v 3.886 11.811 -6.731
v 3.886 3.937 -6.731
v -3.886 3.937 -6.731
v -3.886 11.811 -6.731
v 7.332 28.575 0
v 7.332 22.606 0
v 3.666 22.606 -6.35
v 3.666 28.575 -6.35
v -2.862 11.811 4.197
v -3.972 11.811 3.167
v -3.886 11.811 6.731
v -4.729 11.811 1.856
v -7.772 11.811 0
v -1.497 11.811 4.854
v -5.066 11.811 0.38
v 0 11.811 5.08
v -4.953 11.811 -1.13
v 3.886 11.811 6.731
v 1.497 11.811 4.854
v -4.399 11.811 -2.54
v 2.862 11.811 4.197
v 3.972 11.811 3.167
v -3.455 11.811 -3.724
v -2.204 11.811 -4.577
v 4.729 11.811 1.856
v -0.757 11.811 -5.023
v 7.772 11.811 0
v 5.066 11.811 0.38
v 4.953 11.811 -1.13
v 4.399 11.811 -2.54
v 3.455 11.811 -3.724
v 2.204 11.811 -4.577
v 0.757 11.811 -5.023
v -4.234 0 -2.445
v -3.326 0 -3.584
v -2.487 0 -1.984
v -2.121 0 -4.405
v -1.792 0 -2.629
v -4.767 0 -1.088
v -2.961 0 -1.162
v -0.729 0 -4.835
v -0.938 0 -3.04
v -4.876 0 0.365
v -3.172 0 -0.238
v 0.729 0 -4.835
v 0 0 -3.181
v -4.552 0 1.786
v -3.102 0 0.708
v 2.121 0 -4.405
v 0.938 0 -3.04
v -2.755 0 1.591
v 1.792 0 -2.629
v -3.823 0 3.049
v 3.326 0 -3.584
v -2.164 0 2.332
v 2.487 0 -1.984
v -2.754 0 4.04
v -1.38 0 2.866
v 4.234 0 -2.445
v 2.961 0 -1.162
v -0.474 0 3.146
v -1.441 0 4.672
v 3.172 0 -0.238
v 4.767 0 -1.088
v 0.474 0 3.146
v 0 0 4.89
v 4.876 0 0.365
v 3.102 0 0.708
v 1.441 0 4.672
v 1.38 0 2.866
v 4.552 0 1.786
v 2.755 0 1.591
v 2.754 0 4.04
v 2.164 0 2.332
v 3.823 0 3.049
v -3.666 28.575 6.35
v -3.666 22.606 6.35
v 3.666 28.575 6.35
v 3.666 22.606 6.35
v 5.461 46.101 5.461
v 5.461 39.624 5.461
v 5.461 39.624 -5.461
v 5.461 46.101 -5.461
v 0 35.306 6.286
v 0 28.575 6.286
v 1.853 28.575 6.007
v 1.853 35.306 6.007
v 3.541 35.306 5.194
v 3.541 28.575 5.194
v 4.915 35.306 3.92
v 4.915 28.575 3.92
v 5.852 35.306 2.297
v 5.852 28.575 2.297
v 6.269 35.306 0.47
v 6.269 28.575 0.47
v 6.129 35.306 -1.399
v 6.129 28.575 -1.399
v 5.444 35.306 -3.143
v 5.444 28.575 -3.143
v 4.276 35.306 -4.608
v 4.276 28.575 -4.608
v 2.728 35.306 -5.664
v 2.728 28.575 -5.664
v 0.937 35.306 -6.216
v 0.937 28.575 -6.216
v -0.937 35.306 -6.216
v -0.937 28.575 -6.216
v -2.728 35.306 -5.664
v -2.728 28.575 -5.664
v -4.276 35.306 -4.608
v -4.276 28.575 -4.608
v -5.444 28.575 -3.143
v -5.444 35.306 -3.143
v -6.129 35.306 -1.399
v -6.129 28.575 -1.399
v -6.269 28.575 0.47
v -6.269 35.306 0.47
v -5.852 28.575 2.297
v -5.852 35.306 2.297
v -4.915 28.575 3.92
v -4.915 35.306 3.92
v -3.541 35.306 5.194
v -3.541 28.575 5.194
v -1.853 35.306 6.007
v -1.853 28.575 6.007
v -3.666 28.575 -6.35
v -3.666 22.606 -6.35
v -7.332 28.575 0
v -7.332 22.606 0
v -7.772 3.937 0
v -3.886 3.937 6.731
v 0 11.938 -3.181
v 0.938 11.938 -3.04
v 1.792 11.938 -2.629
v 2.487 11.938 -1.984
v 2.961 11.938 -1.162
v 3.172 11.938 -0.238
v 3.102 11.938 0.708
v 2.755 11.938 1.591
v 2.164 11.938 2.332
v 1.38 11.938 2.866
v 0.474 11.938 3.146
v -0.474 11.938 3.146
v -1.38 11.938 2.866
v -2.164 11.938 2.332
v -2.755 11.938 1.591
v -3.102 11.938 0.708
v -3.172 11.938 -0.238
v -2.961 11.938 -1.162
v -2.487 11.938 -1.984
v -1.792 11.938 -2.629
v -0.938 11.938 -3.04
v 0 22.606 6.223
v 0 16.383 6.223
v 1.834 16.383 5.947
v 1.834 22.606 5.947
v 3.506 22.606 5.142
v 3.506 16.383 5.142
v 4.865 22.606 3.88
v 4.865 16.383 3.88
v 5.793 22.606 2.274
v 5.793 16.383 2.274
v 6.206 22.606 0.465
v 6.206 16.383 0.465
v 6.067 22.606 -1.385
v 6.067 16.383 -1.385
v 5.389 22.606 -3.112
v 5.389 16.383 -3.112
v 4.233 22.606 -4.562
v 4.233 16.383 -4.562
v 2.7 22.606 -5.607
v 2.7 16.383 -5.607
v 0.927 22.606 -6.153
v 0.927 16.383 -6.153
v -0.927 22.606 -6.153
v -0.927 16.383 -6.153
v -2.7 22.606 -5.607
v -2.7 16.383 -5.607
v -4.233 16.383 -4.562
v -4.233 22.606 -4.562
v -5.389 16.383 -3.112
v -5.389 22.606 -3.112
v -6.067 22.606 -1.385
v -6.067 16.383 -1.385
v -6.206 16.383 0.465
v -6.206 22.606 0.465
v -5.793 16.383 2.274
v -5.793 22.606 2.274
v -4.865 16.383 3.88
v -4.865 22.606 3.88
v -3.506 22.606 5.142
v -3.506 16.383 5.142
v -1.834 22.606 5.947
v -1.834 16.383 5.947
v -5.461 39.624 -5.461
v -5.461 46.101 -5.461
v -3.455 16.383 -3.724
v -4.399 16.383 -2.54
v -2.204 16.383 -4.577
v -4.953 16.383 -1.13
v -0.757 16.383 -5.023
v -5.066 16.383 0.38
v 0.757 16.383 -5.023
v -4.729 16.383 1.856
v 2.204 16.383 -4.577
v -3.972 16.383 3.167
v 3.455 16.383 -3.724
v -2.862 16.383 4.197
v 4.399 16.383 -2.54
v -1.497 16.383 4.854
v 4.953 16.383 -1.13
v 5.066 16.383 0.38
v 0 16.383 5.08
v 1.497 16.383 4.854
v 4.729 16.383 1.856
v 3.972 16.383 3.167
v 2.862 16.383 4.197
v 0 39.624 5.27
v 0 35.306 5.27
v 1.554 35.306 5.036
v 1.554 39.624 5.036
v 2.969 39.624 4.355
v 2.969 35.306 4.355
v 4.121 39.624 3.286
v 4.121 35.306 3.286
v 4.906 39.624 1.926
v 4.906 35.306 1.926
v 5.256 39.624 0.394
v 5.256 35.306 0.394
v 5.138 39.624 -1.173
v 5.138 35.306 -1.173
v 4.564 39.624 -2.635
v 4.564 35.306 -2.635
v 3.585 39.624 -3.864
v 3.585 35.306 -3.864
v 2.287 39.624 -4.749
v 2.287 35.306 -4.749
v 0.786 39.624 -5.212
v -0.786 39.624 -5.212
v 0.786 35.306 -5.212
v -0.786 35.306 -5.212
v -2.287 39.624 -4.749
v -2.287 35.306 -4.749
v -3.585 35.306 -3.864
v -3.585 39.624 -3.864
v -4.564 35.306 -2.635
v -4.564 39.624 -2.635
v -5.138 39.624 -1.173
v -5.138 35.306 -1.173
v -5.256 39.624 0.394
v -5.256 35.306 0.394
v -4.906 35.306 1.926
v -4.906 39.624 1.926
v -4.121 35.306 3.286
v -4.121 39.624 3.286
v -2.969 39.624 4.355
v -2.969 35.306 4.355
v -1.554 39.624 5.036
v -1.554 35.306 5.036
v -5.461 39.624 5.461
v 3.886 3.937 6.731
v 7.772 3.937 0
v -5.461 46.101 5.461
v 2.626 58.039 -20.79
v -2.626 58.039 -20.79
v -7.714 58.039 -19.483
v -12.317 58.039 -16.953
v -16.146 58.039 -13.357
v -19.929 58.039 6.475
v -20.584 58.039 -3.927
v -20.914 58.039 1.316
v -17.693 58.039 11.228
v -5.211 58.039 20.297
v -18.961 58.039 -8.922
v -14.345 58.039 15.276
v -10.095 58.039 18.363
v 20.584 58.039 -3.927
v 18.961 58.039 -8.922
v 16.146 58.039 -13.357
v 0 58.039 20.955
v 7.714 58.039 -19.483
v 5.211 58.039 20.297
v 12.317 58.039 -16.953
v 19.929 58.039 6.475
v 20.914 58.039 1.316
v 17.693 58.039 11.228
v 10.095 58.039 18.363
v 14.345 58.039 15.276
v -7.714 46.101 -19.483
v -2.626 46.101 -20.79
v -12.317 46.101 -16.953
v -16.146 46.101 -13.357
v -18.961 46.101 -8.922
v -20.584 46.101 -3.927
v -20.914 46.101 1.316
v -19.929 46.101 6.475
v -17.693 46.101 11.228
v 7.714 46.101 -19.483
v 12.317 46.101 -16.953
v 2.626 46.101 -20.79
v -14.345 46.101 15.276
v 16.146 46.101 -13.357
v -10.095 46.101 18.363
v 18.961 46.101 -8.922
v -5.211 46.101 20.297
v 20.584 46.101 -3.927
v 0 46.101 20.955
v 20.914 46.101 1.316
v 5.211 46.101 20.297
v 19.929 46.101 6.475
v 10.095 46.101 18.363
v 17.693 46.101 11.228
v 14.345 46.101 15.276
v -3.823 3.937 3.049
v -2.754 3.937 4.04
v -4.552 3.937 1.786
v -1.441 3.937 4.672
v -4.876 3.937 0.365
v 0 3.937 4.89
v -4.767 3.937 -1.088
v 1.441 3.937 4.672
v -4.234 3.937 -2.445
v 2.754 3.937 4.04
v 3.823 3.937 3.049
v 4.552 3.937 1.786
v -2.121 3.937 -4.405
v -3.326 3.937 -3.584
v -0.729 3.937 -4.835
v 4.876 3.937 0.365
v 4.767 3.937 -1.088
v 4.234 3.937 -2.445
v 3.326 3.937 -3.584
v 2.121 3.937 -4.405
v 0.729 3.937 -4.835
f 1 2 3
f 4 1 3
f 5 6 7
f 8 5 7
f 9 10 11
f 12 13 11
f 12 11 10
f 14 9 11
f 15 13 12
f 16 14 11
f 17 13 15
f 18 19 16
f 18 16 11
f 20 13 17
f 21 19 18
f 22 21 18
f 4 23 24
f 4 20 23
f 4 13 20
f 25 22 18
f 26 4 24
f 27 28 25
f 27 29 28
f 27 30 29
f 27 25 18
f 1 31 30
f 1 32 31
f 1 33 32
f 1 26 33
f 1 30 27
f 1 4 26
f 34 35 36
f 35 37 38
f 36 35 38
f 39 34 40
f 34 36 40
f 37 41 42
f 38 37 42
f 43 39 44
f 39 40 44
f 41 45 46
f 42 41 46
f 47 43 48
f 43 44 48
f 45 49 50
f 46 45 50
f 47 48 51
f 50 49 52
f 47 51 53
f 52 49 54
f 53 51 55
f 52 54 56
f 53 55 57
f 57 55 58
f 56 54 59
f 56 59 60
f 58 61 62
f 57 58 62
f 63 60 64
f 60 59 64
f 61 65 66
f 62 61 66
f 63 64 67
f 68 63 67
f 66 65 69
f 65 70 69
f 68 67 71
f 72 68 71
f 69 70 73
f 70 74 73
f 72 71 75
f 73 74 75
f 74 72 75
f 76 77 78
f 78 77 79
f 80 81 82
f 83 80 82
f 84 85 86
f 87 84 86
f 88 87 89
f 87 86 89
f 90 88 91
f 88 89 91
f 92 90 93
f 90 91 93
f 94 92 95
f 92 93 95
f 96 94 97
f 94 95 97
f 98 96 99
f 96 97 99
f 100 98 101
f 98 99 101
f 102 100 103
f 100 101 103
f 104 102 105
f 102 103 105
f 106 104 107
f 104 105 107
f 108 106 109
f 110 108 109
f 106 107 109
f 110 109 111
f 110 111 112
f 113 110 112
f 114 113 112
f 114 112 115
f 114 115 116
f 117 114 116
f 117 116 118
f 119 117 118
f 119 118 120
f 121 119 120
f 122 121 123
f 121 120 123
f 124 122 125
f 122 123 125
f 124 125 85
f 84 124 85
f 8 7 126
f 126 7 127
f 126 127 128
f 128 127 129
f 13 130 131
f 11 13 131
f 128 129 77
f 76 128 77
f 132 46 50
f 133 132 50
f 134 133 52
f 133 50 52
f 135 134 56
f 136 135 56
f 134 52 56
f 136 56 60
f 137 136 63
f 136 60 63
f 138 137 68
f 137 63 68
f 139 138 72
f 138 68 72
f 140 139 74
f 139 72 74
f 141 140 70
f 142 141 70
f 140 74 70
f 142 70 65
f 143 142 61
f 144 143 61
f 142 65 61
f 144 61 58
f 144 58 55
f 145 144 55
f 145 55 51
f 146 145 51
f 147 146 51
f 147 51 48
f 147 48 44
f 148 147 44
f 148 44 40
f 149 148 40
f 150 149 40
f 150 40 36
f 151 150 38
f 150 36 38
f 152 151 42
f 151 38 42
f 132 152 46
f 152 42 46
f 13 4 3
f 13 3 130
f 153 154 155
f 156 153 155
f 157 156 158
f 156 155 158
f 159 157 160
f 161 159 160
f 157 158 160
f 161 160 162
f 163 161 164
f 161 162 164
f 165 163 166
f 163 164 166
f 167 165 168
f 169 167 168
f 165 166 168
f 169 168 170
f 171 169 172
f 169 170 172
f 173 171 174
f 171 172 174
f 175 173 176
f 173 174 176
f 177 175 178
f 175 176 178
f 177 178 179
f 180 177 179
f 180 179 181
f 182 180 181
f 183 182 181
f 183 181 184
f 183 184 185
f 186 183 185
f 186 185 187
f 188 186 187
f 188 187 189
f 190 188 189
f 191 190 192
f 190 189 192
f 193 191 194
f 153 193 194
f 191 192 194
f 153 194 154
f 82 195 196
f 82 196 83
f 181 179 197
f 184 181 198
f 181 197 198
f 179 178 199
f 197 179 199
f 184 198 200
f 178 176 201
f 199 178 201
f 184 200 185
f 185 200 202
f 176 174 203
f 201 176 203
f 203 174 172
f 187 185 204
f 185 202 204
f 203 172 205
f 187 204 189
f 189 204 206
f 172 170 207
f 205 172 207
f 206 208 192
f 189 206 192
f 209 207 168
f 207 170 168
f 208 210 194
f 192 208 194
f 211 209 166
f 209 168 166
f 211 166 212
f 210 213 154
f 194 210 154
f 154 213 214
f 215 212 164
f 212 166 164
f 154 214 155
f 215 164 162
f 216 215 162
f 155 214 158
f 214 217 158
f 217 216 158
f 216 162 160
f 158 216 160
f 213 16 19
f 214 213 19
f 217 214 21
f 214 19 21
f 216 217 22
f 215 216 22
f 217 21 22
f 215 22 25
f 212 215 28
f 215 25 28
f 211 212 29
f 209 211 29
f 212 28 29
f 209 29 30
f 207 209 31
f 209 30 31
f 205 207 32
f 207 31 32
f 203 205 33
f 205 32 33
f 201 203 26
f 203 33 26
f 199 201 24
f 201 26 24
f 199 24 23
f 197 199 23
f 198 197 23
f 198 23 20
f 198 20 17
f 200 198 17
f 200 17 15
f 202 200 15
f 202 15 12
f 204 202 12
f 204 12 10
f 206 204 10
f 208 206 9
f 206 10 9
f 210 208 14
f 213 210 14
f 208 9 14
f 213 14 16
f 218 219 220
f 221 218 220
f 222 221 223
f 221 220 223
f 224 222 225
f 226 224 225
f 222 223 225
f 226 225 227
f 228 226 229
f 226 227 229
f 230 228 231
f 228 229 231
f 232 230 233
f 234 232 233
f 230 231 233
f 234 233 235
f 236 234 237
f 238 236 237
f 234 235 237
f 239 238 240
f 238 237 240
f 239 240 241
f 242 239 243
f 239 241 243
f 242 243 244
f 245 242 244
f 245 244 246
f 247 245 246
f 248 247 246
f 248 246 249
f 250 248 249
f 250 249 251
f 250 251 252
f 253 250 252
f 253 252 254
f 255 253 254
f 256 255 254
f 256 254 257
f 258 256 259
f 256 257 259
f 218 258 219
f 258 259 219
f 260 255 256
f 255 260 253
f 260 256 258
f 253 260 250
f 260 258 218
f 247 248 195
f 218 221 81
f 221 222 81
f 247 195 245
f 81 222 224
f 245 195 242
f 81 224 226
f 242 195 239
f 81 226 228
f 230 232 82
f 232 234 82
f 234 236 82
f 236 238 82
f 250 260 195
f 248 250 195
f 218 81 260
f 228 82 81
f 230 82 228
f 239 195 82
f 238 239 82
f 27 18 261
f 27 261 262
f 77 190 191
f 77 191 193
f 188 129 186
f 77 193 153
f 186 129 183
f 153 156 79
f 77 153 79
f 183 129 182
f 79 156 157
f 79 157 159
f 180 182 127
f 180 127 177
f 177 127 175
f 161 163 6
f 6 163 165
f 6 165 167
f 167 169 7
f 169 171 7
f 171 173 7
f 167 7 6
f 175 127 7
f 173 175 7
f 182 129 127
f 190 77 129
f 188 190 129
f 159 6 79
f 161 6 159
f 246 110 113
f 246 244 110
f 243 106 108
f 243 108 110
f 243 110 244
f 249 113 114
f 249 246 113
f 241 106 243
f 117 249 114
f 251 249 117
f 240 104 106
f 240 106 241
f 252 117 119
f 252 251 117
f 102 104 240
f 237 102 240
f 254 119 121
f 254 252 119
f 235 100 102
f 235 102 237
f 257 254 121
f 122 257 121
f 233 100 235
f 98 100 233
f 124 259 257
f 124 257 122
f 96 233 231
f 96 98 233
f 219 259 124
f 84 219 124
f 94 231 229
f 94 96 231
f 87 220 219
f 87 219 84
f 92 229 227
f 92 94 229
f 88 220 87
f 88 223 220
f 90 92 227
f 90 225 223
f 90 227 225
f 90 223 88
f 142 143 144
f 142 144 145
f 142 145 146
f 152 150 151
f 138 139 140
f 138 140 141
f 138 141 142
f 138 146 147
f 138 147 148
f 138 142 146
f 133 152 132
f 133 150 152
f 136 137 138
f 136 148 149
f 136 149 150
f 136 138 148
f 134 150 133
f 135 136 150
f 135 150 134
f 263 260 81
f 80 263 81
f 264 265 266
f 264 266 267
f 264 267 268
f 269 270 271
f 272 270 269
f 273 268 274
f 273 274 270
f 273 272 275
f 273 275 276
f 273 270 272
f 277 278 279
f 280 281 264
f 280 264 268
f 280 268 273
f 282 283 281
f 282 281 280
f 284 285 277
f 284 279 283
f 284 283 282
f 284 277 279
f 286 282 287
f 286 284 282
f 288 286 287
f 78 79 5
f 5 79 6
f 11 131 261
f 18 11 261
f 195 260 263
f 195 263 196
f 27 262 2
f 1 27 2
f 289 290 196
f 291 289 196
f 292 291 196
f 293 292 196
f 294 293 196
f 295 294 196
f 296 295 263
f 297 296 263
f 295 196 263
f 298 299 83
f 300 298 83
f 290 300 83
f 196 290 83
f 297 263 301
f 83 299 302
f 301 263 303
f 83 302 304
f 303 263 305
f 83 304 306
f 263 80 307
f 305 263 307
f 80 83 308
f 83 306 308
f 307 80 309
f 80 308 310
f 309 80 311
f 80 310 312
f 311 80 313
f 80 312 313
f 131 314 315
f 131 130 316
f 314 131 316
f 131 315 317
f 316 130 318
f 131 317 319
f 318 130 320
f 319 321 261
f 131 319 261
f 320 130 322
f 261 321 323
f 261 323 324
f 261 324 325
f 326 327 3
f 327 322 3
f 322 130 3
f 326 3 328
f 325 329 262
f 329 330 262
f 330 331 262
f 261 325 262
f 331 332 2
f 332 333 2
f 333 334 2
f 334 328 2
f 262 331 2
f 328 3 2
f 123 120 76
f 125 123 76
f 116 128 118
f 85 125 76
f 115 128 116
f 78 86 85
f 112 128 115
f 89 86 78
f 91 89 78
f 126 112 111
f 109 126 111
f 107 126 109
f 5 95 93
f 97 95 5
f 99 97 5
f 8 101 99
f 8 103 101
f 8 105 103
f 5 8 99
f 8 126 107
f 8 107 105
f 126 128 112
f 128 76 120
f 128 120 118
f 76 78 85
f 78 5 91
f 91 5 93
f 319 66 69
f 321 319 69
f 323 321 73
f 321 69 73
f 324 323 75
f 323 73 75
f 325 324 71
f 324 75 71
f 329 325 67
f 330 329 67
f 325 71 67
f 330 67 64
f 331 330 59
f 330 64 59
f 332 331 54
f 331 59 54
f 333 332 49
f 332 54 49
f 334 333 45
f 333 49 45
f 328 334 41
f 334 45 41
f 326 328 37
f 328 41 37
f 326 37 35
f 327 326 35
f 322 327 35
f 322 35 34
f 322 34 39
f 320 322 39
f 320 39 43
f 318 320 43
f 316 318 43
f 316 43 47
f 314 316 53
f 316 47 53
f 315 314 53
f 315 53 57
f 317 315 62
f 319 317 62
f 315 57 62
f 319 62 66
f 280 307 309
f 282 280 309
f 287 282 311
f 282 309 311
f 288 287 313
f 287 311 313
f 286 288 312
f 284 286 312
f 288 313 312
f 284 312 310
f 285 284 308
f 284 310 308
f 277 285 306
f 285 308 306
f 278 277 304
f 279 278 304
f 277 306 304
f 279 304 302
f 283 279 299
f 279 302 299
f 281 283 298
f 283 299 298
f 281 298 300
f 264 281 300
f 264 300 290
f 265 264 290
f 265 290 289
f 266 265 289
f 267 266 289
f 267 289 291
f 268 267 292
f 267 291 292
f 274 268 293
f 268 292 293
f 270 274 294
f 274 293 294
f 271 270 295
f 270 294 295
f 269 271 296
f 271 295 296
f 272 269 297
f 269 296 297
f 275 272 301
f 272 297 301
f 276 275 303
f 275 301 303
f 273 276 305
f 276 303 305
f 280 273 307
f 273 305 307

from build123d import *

# Parameters (mm, degrees)
SKETCH1_R           = 4.8895
BOSS_EXTRUDE1_DEPTH = 3.937
BOSS_EXTRUDE2_DEPTH = 7.874
SKETCH3_R           = 5.08
BOSS_EXTRUDE3_DEPTH = 4.572
SKETCH4_R           = 6.223
BOSS_EXTRUDE4_DEPTH = 6.223
BOSS_EXTRUDE5_DEPTH = 5.969
SKETCH6_R           = 6.2865
BOSS_EXTRUDE6_DEPTH = 6.731
SKETCH7_R           = 5.2705
BOSS_EXTRUDE7_DEPTH = 4.318
SKETCH9_W           = 10.922
SKETCH9_H           = 10.922
BOSS_EXTRUDE8_DEPTH = 6.477
SKETCH10_R          = 20.955
BOSS_EXTRUDE9_DEPTH = 11.938
SKETCH11_R          = 3.18135
CUT_EXTRUDE1_DEPTH  = 11.938


with BuildPart() as part:
    # Sketch1 → Boss-Extrude1 (new body)
    with BuildSketch(Plane(origin=(0, 0, 0), x_dir=(1, 0, 0), z_dir=(0, 1, 0))):
        with Locations(Location((0, 0, 0), (0, 0, 270))):
            Circle(SKETCH1_R)
    extrude(amount=BOSS_EXTRUDE1_DEPTH)

    # Sketch2 → Boss-Extrude2 (add)
    with BuildSketch(Plane(origin=(0, 3.937, 0), x_dir=(1, 0, 0), z_dir=(0, 1, 0))):
        Polygon((7.772289324, 0), (3.886144662, 6.731), (-3.886144662, 6.731), (-7.772289324, 0), (-3.886144662, -6.731), (3.886144662, -6.731), align=None)
    extrude(amount=BOSS_EXTRUDE2_DEPTH)

    # Sketch3 → Boss-Extrude3 (add)
    with BuildSketch(Plane(origin=(0, 11.811, 0), x_dir=(1, 0, 0), z_dir=(0, 1, 0))):
        with Locations(Location((0, 0, 0), (0, 0, 270))):
            Circle(SKETCH3_R)
    extrude(amount=BOSS_EXTRUDE3_DEPTH)

    # Sketch4 → Boss-Extrude4 (add)
    with BuildSketch(Plane(origin=(0, 16.383, 0), x_dir=(1, 0, 0), z_dir=(0, 1, 0))):
        with Locations(Location((0, 0, 0), (0, 0, 270))):
            Circle(SKETCH4_R)
    extrude(amount=BOSS_EXTRUDE4_DEPTH)

    # Sketch5 → Boss-Extrude5 (add)
    with BuildSketch(Plane(origin=(0, 22.606, 0), x_dir=(1, 0, 0), z_dir=(0, 1, 0))):
        Polygon((7.332348419, 0), (3.666174209, 6.35), (-3.666174209, 6.35), (-7.332348419, 0), (-3.666174209, -6.35), (3.666174209, -6.35), align=None)
    extrude(amount=BOSS_EXTRUDE5_DEPTH)

    # Sketch6 → Boss-Extrude6 (add)
    with BuildSketch(Plane(origin=(0, 28.575, 0), x_dir=(1, 0, 0), z_dir=(0, 1, 0))):
        with Locations(Location((0, 0, 0), (0, 0, 270))):
            Circle(SKETCH6_R)
    extrude(amount=BOSS_EXTRUDE6_DEPTH)

    # Sketch7 → Boss-Extrude7 (add)
    with BuildSketch(Plane(origin=(0, 35.306, 0), x_dir=(1, 0, 0), z_dir=(0, 1, 0))):
        with Locations(Location((0, 0, 0), (0, 0, 270))):
            Circle(SKETCH7_R)
    extrude(amount=BOSS_EXTRUDE7_DEPTH)

    # Sketch9 → Boss-Extrude8 (add)
    with BuildSketch(Plane(origin=(0, 39.624, 0), x_dir=(1, 0, 0), z_dir=(0, 1, 0))):
        Rectangle(SKETCH9_W, SKETCH9_H)
    extrude(amount=BOSS_EXTRUDE8_DEPTH)

    # Sketch10 → Boss-Extrude9 (add)
    with BuildSketch(Plane(origin=(0, 46.101, 0), x_dir=(1, 0, 0), z_dir=(0, 1, 0))):
        with Locations(Location((0, 0, 0), (0, 0, 270))):
            Circle(SKETCH10_R)
    extrude(amount=BOSS_EXTRUDE9_DEPTH)

    # Sketch11 → Cut-Extrude1 (cut)
    with BuildSketch(Plane.XZ):
        with Locations(Location((0, 0, 0), (0, 0, 270))):
            Circle(SKETCH11_R)
    extrude(amount=-CUT_EXTRUDE1_DEPTH, mode=Mode.SUBTRACT)


solid = part.part
